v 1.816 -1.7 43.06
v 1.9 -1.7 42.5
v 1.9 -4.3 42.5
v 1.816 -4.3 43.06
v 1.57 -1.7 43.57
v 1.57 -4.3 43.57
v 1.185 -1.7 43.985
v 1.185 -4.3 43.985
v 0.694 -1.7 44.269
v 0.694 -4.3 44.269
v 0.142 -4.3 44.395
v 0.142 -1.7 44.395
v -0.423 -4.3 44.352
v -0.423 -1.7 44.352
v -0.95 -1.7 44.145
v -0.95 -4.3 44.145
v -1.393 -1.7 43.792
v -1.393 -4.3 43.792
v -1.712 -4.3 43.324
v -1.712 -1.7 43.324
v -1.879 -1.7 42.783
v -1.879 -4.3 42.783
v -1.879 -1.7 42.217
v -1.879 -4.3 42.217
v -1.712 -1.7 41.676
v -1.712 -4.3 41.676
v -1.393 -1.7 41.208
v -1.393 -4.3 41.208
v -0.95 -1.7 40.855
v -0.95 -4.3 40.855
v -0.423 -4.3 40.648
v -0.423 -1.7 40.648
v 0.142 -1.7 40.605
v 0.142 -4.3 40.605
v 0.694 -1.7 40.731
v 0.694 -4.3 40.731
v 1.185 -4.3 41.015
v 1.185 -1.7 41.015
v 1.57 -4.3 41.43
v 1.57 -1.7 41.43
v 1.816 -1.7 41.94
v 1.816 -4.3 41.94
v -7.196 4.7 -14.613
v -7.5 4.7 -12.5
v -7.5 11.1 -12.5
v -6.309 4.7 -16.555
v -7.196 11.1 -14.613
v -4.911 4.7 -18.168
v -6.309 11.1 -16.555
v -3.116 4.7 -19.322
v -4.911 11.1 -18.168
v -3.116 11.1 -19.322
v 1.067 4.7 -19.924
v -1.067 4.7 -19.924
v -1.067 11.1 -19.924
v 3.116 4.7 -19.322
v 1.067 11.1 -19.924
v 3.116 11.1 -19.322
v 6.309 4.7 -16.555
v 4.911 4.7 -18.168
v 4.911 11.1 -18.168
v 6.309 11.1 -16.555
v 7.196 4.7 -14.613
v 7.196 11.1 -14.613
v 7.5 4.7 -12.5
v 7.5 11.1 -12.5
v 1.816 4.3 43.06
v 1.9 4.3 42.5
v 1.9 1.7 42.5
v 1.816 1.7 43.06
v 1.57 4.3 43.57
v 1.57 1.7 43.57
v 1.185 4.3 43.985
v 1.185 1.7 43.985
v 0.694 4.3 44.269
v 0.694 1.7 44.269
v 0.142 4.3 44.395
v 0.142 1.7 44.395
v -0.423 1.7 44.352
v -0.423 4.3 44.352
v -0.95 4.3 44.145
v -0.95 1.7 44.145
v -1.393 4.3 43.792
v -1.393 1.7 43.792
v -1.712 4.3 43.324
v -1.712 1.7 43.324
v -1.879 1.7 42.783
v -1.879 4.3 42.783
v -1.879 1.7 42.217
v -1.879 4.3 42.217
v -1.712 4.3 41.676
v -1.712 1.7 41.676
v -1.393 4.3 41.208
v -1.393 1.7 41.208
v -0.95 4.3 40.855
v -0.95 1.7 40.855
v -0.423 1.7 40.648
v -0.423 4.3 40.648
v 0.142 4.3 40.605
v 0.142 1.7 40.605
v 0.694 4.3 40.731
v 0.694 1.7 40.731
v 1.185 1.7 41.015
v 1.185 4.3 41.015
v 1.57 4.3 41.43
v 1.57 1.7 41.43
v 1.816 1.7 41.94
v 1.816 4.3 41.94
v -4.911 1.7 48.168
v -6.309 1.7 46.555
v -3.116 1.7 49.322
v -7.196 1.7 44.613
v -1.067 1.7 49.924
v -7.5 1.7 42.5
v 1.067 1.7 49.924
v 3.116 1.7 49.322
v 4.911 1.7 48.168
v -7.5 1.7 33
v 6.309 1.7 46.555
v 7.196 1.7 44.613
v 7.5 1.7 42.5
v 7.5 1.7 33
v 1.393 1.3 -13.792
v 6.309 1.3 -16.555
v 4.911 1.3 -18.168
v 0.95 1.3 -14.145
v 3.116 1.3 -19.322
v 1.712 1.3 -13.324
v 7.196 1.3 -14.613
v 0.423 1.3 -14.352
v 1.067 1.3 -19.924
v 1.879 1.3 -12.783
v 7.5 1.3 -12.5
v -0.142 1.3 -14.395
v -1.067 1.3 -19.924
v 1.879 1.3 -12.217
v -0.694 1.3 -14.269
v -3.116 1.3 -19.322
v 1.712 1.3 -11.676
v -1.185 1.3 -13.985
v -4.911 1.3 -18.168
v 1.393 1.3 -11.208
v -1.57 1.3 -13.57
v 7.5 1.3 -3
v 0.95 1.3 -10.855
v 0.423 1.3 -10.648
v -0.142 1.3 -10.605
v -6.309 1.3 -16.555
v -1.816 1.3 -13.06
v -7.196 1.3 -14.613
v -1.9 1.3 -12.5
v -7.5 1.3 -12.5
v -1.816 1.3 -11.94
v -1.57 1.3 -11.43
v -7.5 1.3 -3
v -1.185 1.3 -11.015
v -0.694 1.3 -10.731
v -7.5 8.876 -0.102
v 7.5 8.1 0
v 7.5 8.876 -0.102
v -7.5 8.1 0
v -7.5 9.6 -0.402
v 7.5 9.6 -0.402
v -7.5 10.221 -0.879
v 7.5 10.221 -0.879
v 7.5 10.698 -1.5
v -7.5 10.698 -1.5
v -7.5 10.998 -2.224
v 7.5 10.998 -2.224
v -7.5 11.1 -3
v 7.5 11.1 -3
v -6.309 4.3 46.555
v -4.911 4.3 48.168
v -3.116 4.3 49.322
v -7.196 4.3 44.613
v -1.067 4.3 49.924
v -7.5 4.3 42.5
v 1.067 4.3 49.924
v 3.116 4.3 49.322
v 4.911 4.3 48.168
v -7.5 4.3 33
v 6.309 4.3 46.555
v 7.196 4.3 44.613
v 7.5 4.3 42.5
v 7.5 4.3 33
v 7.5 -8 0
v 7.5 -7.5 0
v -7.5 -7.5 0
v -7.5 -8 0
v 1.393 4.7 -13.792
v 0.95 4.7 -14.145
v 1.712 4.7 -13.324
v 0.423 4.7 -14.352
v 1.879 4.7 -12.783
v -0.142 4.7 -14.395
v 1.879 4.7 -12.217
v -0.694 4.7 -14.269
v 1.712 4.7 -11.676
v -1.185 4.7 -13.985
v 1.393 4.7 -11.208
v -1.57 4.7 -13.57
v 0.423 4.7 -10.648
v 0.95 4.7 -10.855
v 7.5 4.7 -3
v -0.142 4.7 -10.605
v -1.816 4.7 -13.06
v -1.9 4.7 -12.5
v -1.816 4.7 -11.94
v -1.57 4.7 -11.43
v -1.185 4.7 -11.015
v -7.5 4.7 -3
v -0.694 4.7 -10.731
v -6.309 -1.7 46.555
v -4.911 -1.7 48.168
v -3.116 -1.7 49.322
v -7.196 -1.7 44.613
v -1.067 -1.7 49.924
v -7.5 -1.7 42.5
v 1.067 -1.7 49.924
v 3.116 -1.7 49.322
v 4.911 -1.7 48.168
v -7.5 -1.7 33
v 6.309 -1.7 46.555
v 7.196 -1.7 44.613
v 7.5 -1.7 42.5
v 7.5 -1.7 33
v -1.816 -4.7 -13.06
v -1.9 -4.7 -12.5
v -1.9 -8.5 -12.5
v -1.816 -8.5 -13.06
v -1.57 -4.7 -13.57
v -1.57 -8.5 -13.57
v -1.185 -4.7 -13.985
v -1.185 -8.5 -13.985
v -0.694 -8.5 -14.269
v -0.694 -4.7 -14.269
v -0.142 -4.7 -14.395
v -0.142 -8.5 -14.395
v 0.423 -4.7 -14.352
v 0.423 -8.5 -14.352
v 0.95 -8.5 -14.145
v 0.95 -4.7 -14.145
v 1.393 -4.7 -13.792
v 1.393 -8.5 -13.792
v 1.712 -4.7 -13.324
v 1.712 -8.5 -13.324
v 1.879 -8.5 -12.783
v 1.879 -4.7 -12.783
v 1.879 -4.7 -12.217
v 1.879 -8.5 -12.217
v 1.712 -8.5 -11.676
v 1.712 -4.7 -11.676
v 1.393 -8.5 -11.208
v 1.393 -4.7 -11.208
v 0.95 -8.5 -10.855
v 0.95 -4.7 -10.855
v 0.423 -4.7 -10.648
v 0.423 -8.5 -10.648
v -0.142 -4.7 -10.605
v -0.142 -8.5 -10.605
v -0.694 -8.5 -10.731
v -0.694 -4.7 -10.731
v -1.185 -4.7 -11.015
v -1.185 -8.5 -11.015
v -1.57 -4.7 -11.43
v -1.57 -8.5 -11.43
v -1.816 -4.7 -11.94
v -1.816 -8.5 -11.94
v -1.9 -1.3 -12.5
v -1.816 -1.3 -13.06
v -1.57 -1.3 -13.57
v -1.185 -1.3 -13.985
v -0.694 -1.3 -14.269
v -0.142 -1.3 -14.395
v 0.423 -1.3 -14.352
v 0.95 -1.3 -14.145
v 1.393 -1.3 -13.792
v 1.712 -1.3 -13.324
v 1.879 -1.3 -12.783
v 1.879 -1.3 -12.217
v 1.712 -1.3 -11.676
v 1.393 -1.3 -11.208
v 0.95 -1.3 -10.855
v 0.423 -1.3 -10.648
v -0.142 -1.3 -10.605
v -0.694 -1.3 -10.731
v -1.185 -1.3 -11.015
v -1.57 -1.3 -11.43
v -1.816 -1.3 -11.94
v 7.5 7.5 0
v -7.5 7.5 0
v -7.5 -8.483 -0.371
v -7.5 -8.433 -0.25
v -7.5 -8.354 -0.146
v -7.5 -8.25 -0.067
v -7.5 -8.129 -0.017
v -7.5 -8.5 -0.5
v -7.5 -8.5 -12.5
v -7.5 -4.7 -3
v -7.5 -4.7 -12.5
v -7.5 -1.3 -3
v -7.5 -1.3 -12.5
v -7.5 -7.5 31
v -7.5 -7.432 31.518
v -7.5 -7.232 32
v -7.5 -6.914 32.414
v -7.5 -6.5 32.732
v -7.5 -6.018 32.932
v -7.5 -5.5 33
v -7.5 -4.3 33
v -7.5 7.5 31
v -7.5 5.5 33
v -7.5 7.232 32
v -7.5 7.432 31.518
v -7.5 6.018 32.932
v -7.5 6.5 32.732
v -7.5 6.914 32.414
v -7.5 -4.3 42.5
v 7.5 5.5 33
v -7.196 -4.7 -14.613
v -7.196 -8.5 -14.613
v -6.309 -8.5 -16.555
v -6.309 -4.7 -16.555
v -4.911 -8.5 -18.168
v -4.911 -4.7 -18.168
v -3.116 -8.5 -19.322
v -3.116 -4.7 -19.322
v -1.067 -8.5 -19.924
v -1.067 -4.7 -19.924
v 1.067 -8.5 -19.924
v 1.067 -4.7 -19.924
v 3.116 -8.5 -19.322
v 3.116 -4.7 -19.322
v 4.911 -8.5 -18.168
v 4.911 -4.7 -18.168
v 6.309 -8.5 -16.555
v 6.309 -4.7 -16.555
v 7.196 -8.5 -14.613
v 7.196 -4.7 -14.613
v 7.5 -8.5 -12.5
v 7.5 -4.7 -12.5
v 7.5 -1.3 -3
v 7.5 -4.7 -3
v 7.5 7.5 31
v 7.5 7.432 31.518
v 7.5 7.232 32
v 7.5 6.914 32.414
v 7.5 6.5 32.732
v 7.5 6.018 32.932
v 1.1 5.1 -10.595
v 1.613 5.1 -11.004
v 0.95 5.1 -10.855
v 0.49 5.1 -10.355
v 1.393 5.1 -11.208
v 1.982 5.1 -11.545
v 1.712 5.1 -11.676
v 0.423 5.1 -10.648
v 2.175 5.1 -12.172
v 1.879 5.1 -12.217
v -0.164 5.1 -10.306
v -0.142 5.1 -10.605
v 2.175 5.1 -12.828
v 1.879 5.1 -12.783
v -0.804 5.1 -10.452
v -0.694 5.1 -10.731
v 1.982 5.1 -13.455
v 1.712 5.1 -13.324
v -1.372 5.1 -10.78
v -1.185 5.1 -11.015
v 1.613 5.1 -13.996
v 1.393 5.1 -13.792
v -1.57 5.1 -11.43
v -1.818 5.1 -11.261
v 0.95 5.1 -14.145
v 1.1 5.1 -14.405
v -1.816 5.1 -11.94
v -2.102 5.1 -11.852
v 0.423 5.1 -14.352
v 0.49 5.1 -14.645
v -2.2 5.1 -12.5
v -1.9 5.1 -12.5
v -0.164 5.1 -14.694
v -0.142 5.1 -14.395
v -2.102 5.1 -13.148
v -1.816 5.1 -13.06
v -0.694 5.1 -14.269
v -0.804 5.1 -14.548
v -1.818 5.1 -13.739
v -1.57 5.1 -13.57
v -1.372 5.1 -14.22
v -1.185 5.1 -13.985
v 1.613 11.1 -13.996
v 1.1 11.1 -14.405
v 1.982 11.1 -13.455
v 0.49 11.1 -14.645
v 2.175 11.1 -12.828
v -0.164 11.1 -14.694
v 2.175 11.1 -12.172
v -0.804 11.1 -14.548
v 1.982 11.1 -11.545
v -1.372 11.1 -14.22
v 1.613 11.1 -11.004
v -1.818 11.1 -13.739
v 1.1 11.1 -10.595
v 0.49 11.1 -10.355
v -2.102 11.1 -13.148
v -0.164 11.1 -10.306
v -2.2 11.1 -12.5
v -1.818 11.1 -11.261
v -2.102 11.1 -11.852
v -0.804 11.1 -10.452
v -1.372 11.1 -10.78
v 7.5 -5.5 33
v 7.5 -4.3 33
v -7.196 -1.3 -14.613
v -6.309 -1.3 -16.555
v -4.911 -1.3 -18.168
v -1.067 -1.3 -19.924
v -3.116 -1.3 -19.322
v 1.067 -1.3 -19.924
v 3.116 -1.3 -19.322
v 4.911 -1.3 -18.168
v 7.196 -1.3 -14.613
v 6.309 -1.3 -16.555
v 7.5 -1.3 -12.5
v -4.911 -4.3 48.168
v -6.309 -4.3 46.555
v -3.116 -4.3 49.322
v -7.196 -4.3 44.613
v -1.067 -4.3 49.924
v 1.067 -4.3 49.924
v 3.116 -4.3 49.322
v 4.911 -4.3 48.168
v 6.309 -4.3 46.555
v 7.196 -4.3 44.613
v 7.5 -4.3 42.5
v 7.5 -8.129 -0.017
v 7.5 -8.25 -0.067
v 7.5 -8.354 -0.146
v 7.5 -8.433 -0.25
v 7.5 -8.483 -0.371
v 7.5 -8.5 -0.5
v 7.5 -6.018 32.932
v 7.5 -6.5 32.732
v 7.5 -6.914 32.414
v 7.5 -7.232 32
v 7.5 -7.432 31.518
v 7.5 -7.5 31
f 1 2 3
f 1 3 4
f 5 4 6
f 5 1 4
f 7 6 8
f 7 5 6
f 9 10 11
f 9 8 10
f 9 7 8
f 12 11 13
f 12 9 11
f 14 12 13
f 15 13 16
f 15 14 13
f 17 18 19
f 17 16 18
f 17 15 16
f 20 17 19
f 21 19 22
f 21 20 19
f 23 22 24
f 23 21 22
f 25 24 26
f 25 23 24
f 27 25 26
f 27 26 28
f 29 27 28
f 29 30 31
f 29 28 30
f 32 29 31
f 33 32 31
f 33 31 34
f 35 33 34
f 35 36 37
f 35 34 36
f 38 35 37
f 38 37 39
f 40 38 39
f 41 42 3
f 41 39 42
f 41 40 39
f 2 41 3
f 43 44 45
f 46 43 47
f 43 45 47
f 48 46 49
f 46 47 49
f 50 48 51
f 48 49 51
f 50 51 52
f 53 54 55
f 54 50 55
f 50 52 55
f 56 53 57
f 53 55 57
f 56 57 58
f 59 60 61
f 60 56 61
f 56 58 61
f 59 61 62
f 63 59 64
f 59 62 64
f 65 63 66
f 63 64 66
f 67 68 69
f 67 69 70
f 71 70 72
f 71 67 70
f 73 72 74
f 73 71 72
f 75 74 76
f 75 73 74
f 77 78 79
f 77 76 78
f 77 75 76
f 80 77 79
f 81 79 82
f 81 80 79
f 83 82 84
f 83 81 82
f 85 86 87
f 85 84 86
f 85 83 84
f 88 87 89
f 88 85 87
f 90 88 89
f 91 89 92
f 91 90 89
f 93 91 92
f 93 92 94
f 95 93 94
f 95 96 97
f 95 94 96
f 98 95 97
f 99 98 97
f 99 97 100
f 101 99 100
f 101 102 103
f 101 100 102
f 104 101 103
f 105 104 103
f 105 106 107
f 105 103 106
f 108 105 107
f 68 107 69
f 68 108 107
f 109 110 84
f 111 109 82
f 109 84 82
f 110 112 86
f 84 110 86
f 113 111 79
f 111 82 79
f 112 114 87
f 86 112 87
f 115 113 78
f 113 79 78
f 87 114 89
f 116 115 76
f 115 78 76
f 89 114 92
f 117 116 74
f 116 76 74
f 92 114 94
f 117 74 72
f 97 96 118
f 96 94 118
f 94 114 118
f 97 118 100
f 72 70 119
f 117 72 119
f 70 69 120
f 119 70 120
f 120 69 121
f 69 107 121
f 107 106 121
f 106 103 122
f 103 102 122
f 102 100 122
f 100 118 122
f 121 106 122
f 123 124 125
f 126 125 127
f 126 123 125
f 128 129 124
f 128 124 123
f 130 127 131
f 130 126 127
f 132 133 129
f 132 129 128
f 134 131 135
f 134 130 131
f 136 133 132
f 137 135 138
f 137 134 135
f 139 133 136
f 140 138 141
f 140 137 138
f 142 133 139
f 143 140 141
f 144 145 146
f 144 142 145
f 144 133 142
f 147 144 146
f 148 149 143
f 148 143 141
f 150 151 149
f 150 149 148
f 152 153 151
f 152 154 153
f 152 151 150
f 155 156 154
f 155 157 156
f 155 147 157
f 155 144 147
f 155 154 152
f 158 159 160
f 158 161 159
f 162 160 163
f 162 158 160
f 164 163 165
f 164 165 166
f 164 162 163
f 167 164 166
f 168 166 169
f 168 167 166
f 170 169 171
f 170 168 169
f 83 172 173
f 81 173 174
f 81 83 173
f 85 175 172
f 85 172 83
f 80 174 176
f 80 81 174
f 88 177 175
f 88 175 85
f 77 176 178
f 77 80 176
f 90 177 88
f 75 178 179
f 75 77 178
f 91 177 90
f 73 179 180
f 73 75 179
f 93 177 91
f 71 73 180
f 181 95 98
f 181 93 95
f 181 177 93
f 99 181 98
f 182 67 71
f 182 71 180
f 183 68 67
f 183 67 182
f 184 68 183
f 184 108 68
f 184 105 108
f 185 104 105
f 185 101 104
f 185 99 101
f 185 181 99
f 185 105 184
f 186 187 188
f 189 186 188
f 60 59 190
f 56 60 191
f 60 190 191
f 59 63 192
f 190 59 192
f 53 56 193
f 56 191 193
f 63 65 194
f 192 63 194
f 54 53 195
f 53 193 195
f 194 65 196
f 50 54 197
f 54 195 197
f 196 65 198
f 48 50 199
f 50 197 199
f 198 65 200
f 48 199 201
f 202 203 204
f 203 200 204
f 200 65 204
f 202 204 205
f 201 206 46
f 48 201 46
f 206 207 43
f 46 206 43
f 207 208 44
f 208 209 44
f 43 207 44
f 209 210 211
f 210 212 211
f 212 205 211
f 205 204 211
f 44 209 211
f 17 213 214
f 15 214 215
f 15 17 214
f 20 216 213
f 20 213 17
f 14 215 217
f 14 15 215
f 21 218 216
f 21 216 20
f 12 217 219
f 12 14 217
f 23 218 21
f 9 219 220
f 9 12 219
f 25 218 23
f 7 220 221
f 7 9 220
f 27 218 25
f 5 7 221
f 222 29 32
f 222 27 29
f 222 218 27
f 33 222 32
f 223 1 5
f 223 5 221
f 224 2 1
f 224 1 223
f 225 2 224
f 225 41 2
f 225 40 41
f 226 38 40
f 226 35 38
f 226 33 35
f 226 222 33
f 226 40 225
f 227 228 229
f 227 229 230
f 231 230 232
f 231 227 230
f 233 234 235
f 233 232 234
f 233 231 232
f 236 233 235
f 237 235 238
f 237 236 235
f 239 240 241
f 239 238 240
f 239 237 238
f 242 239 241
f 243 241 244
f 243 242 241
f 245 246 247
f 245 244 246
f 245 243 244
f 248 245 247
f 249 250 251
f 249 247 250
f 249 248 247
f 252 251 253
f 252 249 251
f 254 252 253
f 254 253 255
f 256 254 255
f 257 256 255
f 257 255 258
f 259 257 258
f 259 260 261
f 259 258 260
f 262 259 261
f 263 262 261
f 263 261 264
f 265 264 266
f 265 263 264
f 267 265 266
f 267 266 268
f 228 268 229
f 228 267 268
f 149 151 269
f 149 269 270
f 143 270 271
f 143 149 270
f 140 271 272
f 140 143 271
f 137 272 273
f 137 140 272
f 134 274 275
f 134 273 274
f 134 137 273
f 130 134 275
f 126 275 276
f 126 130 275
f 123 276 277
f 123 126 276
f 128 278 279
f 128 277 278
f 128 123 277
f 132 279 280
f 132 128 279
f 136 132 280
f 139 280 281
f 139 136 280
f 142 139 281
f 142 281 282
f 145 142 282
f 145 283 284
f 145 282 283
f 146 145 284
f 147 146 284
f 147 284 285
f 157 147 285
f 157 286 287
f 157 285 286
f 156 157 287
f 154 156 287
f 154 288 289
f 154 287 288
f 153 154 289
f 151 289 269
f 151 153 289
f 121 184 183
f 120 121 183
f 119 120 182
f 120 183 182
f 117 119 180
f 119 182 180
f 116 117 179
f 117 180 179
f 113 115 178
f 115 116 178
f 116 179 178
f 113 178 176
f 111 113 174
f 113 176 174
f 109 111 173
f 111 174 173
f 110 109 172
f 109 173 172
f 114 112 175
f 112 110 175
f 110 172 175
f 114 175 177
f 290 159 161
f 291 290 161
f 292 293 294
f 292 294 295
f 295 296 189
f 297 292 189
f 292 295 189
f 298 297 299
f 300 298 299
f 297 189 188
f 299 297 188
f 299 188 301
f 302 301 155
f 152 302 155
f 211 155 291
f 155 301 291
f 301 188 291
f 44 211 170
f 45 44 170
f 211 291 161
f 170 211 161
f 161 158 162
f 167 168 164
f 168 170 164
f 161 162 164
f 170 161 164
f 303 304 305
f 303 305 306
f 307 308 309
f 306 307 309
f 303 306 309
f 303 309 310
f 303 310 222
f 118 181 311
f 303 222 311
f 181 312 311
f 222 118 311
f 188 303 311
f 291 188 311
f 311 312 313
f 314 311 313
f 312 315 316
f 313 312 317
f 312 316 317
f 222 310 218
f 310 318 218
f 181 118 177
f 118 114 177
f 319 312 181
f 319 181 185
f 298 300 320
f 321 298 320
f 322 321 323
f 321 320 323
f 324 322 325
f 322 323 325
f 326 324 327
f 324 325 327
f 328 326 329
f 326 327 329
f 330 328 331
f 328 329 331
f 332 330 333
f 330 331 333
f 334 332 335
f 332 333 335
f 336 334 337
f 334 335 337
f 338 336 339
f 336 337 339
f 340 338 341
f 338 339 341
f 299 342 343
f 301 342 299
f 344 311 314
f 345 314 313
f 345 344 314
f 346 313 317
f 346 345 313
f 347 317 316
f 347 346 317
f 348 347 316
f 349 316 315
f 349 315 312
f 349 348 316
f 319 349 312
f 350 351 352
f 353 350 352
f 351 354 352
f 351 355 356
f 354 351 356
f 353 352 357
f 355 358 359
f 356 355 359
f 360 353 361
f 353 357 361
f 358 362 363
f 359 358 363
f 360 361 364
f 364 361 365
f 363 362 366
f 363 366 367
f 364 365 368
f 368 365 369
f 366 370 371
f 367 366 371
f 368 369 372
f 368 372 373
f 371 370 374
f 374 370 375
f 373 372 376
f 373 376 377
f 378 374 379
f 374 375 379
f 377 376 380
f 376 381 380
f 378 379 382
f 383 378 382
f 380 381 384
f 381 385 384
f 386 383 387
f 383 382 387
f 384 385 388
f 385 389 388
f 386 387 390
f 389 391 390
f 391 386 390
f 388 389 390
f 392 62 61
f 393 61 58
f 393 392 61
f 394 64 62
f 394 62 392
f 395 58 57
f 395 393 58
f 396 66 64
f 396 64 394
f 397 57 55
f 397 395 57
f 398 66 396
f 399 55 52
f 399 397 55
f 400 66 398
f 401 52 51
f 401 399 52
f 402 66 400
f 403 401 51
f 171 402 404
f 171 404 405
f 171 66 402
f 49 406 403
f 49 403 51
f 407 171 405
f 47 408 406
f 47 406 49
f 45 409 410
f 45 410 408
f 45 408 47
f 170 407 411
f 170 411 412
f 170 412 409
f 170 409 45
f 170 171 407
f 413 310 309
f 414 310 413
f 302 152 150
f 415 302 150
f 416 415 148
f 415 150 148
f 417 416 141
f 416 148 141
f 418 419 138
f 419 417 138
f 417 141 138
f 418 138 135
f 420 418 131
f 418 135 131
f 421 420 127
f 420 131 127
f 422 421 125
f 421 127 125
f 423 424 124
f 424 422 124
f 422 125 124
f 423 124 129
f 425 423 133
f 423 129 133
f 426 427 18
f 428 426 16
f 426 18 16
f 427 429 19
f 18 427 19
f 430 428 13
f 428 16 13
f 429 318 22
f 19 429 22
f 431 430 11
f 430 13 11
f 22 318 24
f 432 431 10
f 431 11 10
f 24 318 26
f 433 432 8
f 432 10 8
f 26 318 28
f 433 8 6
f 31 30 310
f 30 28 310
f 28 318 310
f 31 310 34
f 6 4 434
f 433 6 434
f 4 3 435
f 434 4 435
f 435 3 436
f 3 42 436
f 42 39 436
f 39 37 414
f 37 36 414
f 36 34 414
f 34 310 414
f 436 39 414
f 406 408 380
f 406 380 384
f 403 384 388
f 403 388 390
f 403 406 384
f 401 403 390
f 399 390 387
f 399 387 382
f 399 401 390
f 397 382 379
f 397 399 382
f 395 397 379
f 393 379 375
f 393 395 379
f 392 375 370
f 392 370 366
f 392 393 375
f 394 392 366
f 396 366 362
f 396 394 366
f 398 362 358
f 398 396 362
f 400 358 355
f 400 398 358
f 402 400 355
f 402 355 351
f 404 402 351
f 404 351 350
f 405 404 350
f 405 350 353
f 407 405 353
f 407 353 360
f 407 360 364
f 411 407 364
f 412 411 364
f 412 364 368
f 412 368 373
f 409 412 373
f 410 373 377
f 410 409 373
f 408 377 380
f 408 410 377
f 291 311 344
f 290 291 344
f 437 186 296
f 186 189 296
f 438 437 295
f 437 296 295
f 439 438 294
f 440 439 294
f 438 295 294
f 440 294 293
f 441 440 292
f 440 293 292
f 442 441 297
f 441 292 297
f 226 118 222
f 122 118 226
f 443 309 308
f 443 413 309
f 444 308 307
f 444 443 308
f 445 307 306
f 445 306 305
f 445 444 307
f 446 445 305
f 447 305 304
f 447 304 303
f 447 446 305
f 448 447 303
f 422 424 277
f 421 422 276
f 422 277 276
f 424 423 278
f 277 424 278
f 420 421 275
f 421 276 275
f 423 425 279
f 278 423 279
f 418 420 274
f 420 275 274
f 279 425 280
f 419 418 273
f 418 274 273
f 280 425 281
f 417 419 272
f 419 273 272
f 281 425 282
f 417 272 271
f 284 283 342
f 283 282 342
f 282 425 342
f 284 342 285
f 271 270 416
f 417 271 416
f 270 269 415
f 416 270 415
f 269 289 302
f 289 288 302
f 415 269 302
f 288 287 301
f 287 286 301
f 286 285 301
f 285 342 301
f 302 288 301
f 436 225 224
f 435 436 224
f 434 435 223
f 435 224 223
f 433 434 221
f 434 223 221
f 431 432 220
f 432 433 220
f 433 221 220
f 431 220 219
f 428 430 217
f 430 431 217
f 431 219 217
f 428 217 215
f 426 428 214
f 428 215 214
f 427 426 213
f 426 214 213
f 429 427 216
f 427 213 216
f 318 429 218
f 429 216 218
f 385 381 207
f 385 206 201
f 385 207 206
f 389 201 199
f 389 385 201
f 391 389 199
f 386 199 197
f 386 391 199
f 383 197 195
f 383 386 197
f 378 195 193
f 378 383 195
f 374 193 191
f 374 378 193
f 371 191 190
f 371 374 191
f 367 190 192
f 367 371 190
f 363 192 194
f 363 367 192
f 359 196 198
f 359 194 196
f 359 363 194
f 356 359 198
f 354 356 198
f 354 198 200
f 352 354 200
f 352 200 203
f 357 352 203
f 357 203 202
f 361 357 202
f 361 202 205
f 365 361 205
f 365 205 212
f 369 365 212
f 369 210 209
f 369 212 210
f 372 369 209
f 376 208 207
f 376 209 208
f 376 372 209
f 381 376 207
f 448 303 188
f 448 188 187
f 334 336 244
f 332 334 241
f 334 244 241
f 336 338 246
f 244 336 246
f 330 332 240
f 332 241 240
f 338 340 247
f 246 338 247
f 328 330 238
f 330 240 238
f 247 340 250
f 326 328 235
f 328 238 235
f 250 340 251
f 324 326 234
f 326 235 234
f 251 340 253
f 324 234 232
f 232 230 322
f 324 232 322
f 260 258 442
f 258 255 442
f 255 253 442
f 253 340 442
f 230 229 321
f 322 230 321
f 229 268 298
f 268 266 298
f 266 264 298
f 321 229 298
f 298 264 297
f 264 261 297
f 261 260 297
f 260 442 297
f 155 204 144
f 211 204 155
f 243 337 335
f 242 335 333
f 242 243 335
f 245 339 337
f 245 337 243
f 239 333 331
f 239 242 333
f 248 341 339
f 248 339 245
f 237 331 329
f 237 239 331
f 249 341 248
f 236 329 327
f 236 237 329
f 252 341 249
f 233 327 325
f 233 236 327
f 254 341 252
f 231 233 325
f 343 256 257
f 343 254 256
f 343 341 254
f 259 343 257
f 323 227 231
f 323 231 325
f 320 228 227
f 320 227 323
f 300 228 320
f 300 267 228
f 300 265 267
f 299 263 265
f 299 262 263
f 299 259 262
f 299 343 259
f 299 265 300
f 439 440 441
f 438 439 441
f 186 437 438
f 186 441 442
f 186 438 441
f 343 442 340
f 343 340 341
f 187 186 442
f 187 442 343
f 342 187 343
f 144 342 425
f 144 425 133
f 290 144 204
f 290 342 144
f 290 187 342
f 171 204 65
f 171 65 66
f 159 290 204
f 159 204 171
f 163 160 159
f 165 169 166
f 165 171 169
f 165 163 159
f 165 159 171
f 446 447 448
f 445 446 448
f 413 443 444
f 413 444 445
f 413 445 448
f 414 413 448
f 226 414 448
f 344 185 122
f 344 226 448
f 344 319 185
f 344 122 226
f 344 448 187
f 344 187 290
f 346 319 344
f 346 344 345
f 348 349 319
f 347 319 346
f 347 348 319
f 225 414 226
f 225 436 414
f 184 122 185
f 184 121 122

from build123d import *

# Parameters (mm, degrees)
CYLINDER004_R             = 1.9
CYLINDER004_DEPTH         = 15
BOX005_W                  = 15
BOX005_H                  = 3.4
BOX005_DEPTH              = 17
ARRAY001_Y_COUNT          = 3
ARRAY001_Y_PITCH          = 6
CYLINDER003_R             = 7.5
CYLINDER003_DEPTH         = 15
BOX004_W                  = 15
BOX004_H                  = 15
BOX004_DEPTH              = 12.5
BOX003_W                  = 15
BOX003_H                  = 3.4
BOX003_DEPTH              = 17
ARRAY_Y_COUNT             = 2
ARRAY_Y_PITCH             = 6
CYLINDER002_R             = 2.2
CYLINDER002_DEPTH         = 6
CYLINDER001_R             = 1.9
CYLINDER001_DEPTH         = 15
FUSION001_PLACEMENT_ANGLE = 90
CYLINDER_R                = 7.5
CYLINDER_DEPTH            = 19.6
BOX002_W                  = 15
BOX002_H                  = 19.6
BOX002_DEPTH              = 12.5
BODY009_PLACEMENT_ANGLE   = 180
BOX012_W                  = 15
BOX012_H                  = 15
BOX012_DEPTH              = 30
FILLET003_1_R             = 3
FILLET003_2_R             = 2
FILLET003_3_R             = 0.5


with BuildPart() as side_2_bolt_hole:
    # Cylinder004 → Cylinder004 (new body)
    with BuildSketch(Plane(origin=(0, 7.5, 12.5), x_dir=(1, 0, 0), z_dir=(0, -1, 0))):
        Circle(CYLINDER004_R)
    extrude(amount=CYLINDER004_DEPTH)


with BuildPart() as side_2_extract_fusion:
    # Box005 → Box005 (new body)
    with BuildSketch(Plane(origin=(-7.5, -7.7, 3), x_dir=(1, 0, 0), z_dir=(0, 0, 1))):
        with Locations((7.5, 1.7)):
            Rectangle(BOX005_W, BOX005_H)
    extrude(amount=BOX005_DEPTH)

    # Array001 Y: side 2 extract fusion ×3


with BuildPart() as side_2_extract_fusion_1:
    add(side_2_extract_fusion.part)
    with Locations(*[(0, i * ARRAY001_Y_PITCH, 0) for i in range(1, ARRAY001_Y_COUNT)]):
        add(side_2_extract_fusion.part)

    # Fusion004: union side 2 bolt hole
    add(side_2_bolt_hole.part)


with BuildPart() as outer_cylinder001:
    # Cylinder003 → Cylinder003 (new body)
    with BuildSketch(Plane(origin=(0, 7.5, 12.5), x_dir=(1, 0, 0), z_dir=(0, -1, 0))):
        Circle(CYLINDER003_R)
    extrude(amount=CYLINDER003_DEPTH)


with BuildPart() as side_2_cut_clone003:
    # Box004 → Box004 (new body)
    with BuildSketch(Plane(origin=(-7.5, -7.5, 0), x_dir=(1, 0, 0), z_dir=(0, 0, 1))):
        with Locations((7.5, 7.5)):
            Rectangle(BOX004_W, BOX004_H)
    extrude(amount=BOX004_DEPTH)

    # Fusion003: union outer cylinder001
    add(outer_cylinder001.part)

    # Cut001: cut side 2 extract fusion
    add(side_2_extract_fusion_1.part, mode=Mode.SUBTRACT)


with BuildPart() as side_2_cut_clone003_1:
    # Body008 placement: moved
    add(side_2_cut_clone003.part.moved(Location((0, 0, 30))))


with BuildPart() as side_3_extract_cube_array:
    # Box003 → Box003 (new body)
    with BuildSketch(Plane(origin=(-7.5, -7.7, 3), x_dir=(1, 0, 0), z_dir=(0, 0, 1))):
        with Locations((7.5, 1.7)):
            Rectangle(BOX003_W, BOX003_H)
    extrude(amount=BOX003_DEPTH)

    # Array Y: side 3 extract cube array ×2


with BuildPart() as side_3_extract_cube_array_1:
    add(side_3_extract_cube_array.part)
    with Locations(*[(0, i * ARRAY_Y_PITCH, 0) for i in range(1, ARRAY_Y_COUNT)]):
        add(side_3_extract_cube_array.part)


with BuildPart() as side_3_extract_cube_array_2:
    # Array placement: moved
    add(side_3_extract_cube_array_1.part.moved(Location((0, 3, 0))))


with BuildPart() as insert_hole:
    # Cylinder002 → Cylinder002 (new body)
    with BuildSketch(Plane.XY):
        Circle(CYLINDER002_R)
    extrude(amount=CYLINDER002_DEPTH)


with BuildPart() as side_3_extract_fusion:
    # Cylinder001 → Cylinder001 (new body)
    with BuildSketch(Plane.XY.offset(6)):
        Circle(CYLINDER001_R)
    extrude(amount=CYLINDER001_DEPTH)

    # Fusion001: union insert hole
    add(insert_hole.part)


with BuildPart() as side_3_extract_fusion_1:
    # Fusion001 placement: moved
    add(side_3_extract_fusion.part.moved(Location((0, 11.1, 12.5))).rotate(Axis((0, 11.1, 12.5), (1, 0, 0)), FUSION001_PLACEMENT_ANGLE))

    # Fusion002: union side 3 extract cube array
    add(side_3_extract_cube_array_2.part)


with BuildPart() as outer_cylinder:
    # Cylinder → Cylinder (new body)
    with BuildSketch(Plane(origin=(0, 11.1, 12.5), x_dir=(1, 0, 0), z_dir=(0, -1, 0))):
        Circle(CYLINDER_R)
    extrude(amount=CYLINDER_DEPTH)


with BuildPart() as side_3_cut_clone003:
    # Box002 → Box002 (new body)
    with BuildSketch(Plane(origin=(-7.5, -8.5, 0), x_dir=(1, 0, 0), z_dir=(0, 0, 1))):
        with Locations((7.5, 9.8)):
            Rectangle(BOX002_W, BOX002_H)
    extrude(amount=BOX002_DEPTH)

    # Fusion: union outer cylinder
    add(outer_cylinder.part)

    # Cut: cut side 3 extract fusion
    add(side_3_extract_fusion_1.part, mode=Mode.SUBTRACT)


with BuildPart() as side_3_cut_clone003_1:
    # Body009 placement: moved
    add(side_3_cut_clone003.part.rotate(Axis((0, 0, 0), (0, 1, 0)), BODY009_PLACEMENT_ANGLE))


with BuildPart() as extender_stick_fillet:
    # Box012 → Box012 (new body)
    with BuildSketch(Plane(origin=(-7.5, -7.5, 0), x_dir=(1, 0, 0), z_dir=(0, 0, 1))):
        with Locations((7.5, 7.5)):
            Rectangle(BOX012_W, BOX012_H)
    extrude(amount=BOX012_DEPTH)

    # Fusion010: union side 2 cut clone003, side 3 cut clone003
    add(side_2_cut_clone003_1.part)
    add(side_3_cut_clone003_1.part)

    # Fillet003 1
    fillet003_1_edges = [extender_stick_fillet.edges().sort_by_distance(p)[0] for p in [
        (0, 11.1, 0),
    ]]
    fillet(fillet003_1_edges, radius=FILLET003_1_R)

    # Fillet003 2
    fillet003_2_edges = [extender_stick_fillet.edges().sort_by_distance(p)[0] for p in [
        (0, -7.5, 33),
        (0, 7.5, 33),
    ]]
    fillet(fillet003_2_edges, radius=FILLET003_2_R)

    # Fillet003 3
    fillet003_3_edges = [extender_stick_fillet.edges().sort_by_distance(p)[0] for p in [
        (0, -8.5, 0),
    ]]
    fillet(fillet003_3_edges, radius=FILLET003_3_R)


solid = extender_stick_fillet.part
